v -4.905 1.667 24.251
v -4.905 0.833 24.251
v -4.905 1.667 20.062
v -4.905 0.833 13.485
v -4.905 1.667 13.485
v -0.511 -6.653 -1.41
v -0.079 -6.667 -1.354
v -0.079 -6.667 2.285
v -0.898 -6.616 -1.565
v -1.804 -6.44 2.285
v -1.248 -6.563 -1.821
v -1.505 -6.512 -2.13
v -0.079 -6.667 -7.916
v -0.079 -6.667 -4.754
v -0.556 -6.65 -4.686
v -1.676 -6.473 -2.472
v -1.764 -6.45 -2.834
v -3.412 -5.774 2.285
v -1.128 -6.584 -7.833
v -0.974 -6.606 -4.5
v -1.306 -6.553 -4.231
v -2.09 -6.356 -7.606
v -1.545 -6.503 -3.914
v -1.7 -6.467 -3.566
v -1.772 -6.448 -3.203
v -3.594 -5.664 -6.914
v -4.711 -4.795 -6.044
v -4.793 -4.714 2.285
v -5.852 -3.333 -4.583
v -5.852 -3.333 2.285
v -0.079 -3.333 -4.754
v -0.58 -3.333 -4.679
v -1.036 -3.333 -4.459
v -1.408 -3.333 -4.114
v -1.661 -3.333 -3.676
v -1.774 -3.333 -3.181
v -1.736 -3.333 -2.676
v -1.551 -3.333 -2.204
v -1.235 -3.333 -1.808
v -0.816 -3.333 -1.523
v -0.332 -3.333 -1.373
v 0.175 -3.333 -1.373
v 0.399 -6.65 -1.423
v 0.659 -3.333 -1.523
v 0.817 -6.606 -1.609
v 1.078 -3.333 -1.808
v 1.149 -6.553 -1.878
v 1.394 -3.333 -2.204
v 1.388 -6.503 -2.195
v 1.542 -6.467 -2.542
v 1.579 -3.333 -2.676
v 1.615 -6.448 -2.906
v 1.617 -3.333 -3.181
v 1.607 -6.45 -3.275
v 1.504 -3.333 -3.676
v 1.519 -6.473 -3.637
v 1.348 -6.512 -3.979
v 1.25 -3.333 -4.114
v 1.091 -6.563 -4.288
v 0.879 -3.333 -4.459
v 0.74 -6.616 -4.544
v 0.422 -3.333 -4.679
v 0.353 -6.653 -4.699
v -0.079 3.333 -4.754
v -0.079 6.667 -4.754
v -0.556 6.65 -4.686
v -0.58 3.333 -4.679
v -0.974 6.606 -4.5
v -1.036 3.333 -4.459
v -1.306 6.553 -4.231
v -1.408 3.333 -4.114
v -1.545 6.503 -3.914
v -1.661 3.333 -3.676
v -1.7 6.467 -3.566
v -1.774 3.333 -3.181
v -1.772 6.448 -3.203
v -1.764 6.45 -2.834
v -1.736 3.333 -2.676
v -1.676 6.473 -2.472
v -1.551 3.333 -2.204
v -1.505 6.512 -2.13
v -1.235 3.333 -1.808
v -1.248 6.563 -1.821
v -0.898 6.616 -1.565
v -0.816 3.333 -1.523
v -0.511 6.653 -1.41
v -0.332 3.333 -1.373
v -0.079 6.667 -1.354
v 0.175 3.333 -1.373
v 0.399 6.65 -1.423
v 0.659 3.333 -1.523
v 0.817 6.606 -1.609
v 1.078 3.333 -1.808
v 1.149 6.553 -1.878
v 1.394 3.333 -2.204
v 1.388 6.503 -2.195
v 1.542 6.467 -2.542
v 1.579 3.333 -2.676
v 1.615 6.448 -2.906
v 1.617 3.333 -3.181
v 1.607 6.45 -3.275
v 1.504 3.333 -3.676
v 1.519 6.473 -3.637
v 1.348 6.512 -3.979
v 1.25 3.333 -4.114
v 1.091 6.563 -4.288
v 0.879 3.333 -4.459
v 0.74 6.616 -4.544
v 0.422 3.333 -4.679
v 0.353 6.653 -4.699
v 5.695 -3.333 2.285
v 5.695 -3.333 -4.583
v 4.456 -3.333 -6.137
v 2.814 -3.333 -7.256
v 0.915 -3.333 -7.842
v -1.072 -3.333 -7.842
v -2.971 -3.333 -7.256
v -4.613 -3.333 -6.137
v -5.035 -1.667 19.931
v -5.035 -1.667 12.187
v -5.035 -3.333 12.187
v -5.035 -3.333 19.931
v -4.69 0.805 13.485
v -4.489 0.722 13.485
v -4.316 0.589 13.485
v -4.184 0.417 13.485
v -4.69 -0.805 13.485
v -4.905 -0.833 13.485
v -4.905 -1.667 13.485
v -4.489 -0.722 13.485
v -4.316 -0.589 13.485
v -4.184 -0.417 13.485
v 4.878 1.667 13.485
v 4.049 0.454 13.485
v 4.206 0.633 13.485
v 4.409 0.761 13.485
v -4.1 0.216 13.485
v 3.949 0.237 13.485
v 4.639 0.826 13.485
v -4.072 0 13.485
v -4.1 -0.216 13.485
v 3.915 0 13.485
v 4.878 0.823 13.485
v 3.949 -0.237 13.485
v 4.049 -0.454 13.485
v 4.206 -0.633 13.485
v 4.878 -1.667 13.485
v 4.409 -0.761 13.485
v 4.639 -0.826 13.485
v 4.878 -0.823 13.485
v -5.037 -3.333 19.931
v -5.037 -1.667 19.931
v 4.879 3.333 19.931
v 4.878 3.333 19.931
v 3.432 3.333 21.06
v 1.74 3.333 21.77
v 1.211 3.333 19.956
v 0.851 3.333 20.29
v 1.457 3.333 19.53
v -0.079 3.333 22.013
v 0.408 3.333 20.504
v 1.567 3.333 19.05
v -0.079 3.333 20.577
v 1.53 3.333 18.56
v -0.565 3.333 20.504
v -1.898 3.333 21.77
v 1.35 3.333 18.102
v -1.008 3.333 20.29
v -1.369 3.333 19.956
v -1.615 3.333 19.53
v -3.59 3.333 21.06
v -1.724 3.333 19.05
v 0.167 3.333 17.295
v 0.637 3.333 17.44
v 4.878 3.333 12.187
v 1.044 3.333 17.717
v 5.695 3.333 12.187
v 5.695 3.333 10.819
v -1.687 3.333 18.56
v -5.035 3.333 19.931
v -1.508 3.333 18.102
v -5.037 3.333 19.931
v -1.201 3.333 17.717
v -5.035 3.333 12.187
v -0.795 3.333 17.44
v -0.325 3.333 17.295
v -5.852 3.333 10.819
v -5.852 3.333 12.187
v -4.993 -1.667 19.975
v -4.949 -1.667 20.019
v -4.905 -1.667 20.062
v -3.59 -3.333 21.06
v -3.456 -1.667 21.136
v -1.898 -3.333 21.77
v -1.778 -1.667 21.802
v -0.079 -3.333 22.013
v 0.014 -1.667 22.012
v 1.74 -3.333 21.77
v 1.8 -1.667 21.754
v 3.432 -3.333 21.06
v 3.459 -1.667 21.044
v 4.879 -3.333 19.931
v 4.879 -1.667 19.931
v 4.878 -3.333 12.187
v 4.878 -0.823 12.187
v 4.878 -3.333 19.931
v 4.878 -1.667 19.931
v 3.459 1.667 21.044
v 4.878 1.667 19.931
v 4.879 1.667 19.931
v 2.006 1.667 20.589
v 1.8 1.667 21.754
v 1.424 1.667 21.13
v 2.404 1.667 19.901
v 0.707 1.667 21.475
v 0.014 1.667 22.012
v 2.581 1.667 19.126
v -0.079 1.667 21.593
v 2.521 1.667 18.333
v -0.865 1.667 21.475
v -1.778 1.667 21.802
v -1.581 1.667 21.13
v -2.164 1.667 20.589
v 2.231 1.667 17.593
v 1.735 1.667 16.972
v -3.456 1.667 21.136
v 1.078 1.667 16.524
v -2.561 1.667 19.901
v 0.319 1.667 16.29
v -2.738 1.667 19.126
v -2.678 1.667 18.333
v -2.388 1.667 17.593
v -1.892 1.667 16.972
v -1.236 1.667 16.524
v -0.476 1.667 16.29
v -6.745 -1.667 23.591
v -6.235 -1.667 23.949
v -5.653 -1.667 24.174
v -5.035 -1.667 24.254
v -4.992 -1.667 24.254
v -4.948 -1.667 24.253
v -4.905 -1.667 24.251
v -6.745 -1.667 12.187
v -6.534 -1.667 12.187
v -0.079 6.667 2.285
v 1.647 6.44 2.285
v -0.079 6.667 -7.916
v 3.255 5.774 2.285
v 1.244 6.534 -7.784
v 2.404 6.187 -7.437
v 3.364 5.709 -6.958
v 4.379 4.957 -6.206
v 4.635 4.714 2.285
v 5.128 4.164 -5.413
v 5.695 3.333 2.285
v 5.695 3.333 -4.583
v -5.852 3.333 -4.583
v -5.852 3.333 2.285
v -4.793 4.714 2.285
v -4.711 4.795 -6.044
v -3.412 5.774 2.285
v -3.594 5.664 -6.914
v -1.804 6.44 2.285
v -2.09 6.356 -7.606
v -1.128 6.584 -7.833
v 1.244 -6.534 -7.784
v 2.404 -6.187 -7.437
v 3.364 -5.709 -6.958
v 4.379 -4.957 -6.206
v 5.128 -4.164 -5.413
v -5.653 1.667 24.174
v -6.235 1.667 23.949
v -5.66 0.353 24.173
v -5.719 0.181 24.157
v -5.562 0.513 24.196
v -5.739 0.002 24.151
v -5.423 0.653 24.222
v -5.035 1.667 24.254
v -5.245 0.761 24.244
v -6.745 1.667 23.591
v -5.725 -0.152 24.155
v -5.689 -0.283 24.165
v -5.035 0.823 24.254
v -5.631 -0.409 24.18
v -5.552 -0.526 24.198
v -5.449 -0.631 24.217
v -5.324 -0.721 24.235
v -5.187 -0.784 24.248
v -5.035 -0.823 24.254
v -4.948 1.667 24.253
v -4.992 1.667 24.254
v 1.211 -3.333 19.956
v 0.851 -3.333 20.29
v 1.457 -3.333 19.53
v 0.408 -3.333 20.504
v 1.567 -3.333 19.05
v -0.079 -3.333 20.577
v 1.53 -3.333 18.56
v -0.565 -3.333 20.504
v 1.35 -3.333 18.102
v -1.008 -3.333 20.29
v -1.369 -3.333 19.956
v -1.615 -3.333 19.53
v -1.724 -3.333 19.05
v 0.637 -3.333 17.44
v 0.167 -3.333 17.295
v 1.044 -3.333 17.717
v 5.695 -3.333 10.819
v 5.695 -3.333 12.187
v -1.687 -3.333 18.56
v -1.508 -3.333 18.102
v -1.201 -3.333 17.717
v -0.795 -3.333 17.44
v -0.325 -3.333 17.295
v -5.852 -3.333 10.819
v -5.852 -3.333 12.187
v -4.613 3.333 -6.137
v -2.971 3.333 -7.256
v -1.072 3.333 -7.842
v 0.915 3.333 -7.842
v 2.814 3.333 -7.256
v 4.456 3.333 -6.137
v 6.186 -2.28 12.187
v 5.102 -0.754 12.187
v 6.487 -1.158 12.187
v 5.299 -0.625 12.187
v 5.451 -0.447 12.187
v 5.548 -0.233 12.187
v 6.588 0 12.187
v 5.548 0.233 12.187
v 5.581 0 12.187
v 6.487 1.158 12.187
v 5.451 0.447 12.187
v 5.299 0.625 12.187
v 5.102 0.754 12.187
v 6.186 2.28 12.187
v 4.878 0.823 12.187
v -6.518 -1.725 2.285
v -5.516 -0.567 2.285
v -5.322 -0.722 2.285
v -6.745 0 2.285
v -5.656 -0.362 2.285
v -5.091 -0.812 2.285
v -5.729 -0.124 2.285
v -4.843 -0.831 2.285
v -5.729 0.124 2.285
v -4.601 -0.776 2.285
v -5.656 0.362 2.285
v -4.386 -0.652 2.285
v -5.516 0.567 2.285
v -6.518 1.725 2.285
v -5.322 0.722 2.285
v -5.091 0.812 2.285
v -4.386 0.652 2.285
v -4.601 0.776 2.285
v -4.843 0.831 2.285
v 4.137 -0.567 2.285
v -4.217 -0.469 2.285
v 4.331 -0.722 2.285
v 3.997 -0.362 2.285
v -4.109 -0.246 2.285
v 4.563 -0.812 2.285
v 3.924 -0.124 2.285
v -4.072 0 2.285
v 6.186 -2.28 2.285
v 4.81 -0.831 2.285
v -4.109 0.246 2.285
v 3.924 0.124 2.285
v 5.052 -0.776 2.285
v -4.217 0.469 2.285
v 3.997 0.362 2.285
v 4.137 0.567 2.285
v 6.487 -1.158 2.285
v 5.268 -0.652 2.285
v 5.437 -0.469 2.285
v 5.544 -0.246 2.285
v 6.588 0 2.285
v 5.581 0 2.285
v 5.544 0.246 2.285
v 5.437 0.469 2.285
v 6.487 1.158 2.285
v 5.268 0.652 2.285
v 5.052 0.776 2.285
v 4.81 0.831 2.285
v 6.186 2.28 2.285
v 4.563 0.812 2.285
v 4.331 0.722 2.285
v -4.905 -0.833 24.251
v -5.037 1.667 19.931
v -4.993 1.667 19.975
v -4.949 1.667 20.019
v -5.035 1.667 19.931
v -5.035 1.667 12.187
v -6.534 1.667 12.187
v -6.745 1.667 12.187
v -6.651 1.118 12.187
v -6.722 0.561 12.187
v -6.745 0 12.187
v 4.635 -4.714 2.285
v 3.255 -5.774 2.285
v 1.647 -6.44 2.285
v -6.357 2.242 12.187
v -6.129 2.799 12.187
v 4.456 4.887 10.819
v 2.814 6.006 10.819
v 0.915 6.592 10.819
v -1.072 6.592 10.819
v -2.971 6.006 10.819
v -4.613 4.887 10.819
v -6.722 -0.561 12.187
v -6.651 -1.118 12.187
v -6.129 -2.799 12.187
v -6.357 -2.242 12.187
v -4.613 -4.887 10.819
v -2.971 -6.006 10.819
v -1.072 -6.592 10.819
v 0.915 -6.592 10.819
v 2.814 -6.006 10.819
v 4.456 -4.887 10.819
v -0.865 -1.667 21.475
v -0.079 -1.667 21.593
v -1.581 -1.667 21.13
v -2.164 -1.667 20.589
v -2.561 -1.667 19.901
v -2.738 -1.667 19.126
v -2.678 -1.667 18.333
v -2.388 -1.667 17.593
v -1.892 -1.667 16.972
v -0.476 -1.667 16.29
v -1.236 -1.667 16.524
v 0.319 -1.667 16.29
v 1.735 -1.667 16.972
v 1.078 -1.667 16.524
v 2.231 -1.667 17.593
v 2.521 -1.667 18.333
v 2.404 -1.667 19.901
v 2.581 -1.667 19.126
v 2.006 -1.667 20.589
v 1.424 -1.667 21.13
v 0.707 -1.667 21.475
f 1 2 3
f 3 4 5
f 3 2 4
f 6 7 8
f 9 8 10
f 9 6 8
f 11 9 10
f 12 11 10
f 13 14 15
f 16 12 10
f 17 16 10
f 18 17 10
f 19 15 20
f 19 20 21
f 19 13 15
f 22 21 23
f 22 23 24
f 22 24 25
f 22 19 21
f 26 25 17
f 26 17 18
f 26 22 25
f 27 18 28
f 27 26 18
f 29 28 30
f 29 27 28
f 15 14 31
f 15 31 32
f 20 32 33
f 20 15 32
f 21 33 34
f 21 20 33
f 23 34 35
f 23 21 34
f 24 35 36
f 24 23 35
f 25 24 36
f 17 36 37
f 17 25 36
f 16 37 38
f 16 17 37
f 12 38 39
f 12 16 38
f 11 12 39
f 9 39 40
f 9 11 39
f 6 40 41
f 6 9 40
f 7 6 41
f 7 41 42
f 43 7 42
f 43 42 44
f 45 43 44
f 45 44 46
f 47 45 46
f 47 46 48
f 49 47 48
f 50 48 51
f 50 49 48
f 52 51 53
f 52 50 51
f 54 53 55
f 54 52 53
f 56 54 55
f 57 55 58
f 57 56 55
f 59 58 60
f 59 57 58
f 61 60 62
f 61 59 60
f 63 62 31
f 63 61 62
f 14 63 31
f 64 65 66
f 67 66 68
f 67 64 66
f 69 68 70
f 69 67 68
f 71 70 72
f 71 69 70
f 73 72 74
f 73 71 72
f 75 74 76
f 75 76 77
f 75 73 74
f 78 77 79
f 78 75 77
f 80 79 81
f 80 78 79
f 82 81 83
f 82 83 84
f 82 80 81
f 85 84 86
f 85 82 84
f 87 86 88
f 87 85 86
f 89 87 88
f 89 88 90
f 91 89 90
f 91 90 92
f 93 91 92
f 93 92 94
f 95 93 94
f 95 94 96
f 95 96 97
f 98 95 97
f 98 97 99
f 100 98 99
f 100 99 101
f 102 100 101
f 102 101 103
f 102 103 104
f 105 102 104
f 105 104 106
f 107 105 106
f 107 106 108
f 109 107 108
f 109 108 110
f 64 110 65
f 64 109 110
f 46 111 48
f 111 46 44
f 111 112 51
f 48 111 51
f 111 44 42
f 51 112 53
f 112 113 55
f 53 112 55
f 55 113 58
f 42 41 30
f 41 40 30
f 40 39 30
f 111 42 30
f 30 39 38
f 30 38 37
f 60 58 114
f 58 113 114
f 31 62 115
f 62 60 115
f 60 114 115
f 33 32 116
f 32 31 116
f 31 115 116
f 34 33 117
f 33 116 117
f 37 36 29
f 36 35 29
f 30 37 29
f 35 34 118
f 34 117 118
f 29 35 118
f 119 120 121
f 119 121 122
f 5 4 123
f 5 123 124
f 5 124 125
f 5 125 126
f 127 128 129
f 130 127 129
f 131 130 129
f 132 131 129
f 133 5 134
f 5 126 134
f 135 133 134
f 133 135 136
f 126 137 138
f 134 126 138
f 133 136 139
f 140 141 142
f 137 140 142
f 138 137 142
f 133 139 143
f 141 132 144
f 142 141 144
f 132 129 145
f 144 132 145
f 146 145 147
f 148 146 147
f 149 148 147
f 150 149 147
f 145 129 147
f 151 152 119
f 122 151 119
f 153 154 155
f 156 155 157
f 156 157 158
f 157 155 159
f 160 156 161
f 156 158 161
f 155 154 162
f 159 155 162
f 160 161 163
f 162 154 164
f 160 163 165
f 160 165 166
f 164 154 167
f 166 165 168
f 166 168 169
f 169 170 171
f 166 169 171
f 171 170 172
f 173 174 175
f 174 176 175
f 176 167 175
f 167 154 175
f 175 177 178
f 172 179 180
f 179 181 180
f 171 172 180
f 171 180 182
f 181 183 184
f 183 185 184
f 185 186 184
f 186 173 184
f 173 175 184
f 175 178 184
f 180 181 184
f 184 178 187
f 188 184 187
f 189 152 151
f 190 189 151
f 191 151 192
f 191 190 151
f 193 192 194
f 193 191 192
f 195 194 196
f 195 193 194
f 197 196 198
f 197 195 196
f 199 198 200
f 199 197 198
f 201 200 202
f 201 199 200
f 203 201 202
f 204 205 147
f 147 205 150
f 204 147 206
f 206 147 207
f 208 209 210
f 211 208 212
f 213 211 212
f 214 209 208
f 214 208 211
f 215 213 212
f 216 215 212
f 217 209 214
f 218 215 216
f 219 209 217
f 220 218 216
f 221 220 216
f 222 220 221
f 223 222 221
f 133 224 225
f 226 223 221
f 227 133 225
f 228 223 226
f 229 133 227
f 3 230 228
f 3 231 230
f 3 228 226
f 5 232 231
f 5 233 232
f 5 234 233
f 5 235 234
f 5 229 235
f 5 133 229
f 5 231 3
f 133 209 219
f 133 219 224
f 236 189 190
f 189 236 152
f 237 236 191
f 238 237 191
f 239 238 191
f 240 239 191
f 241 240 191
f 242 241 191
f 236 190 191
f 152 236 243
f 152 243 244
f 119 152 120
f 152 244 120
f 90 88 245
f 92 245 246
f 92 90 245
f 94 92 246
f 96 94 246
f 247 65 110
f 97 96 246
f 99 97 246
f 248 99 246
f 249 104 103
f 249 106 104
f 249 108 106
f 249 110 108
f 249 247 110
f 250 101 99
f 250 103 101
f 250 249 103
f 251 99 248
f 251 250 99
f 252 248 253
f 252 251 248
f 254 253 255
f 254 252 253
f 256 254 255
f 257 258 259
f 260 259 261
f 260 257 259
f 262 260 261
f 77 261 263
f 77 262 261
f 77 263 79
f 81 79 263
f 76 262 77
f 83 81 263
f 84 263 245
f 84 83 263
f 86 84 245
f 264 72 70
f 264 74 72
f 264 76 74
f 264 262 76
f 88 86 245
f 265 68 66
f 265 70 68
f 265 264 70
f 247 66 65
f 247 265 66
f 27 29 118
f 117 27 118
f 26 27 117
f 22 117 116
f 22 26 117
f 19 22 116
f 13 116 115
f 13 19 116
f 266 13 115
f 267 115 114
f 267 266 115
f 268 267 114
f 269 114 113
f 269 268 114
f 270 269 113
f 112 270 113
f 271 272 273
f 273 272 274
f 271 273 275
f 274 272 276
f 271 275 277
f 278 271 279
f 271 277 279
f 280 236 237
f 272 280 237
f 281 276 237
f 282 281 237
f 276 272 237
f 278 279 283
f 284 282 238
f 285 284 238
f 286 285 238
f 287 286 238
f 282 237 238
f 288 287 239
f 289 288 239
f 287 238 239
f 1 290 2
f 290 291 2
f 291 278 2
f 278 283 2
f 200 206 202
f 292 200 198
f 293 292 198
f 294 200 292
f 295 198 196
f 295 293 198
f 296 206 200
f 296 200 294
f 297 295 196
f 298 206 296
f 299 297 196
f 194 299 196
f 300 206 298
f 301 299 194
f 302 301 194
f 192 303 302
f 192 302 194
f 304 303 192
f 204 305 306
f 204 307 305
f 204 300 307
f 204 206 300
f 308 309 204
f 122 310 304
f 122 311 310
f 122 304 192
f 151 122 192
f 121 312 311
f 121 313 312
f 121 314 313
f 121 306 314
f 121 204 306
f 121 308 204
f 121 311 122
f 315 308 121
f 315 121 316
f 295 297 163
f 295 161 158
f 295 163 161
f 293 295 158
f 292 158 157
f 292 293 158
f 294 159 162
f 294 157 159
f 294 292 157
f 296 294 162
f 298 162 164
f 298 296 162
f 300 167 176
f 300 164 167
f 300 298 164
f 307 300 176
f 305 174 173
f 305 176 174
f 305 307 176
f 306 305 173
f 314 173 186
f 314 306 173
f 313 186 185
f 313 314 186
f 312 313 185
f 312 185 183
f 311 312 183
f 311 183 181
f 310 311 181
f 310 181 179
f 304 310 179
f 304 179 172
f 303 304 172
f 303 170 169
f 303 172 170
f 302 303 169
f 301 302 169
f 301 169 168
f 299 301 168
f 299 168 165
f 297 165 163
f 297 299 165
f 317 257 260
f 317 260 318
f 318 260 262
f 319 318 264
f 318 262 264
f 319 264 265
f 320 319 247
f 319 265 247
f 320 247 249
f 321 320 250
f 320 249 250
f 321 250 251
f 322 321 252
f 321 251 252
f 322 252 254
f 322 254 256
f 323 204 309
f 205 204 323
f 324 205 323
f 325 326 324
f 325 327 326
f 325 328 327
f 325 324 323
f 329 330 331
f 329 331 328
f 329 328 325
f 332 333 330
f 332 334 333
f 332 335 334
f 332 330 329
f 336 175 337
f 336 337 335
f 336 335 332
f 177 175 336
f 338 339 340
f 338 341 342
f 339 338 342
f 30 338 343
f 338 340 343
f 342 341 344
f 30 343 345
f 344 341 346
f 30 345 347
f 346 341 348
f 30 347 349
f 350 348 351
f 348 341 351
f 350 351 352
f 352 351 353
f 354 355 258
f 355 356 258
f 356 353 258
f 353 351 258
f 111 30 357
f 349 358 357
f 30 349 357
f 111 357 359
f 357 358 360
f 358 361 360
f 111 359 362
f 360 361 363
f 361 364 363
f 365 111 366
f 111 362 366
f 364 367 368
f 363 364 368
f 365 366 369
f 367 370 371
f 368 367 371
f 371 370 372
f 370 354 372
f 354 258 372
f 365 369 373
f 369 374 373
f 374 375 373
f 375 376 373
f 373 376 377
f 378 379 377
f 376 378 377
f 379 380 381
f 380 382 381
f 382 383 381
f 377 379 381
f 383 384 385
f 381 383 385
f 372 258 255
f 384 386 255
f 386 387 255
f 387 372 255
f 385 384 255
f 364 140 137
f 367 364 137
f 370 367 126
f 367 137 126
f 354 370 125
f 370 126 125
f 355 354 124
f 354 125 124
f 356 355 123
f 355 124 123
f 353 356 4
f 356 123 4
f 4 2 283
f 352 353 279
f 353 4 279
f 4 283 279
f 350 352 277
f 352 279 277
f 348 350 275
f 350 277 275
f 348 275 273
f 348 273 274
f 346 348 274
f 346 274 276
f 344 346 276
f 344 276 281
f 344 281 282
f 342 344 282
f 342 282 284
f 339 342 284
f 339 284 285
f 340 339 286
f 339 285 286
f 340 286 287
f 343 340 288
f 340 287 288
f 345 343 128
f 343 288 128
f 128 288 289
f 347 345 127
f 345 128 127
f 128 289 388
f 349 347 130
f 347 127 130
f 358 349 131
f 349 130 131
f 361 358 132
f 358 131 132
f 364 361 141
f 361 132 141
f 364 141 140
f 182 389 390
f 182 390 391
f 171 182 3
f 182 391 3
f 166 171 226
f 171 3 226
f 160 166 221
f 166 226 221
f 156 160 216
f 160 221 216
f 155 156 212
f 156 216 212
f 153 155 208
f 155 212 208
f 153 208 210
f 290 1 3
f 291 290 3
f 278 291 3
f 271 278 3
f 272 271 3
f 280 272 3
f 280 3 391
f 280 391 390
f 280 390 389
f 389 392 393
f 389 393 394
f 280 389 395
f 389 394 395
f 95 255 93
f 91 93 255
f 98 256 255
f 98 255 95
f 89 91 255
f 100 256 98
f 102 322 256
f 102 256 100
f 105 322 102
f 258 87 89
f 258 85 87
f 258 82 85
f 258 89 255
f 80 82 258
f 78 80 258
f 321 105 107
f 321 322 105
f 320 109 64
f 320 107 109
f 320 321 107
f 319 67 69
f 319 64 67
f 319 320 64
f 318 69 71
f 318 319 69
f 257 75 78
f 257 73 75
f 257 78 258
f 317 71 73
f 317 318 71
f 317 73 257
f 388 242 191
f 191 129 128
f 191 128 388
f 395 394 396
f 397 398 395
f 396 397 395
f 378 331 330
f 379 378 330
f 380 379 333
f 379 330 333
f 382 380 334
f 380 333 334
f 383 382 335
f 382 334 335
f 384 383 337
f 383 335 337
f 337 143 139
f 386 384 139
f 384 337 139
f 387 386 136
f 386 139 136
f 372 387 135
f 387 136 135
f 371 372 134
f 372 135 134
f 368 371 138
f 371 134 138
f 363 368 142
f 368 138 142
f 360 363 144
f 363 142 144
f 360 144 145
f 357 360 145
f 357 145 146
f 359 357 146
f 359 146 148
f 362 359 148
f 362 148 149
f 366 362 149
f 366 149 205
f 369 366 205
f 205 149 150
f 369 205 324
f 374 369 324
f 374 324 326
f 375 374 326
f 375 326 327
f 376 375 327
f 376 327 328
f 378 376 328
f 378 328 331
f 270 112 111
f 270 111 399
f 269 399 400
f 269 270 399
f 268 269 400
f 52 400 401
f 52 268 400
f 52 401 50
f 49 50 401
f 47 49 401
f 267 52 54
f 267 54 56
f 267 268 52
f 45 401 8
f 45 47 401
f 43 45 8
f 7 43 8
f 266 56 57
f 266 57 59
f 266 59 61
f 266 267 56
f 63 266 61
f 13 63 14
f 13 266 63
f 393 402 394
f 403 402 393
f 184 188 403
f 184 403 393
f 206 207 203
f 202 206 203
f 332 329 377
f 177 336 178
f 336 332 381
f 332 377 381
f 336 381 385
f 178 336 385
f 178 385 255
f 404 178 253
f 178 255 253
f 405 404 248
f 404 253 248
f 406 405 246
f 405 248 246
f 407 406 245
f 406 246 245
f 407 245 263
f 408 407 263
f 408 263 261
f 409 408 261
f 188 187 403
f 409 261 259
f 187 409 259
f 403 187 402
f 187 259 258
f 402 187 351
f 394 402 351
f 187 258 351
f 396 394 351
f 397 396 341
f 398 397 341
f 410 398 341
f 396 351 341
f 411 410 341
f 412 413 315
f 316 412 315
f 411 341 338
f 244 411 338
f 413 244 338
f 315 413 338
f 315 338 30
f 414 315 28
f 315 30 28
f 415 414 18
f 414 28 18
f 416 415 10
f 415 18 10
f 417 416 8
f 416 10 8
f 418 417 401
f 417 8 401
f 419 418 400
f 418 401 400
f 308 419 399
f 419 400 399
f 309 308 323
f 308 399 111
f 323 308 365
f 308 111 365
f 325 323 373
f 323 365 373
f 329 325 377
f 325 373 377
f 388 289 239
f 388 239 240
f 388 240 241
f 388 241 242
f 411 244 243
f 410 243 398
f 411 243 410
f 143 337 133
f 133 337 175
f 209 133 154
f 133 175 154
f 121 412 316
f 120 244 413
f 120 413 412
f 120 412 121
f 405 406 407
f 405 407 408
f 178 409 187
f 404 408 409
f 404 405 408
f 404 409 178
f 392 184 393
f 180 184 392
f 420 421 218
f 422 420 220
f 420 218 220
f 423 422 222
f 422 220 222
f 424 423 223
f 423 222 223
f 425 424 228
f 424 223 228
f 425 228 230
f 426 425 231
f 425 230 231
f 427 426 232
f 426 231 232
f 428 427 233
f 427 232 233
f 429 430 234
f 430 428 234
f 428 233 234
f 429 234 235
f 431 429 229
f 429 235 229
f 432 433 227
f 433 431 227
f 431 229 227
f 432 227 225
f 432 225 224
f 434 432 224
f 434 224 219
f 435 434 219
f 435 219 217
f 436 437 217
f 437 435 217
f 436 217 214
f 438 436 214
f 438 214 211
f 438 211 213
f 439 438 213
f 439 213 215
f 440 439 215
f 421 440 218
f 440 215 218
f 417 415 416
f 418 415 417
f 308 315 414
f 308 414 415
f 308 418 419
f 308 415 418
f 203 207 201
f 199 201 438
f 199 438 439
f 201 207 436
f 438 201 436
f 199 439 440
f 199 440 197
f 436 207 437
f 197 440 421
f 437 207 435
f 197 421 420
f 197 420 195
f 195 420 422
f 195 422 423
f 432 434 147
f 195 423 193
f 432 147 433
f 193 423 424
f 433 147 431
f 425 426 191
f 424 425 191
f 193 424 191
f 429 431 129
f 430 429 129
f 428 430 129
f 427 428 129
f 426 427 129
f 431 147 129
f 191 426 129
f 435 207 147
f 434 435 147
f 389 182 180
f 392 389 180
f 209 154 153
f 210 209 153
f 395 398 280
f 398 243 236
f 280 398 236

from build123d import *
from build123d.topology import SkipClean

# Parameters (mm, degrees)
SKETCH2_R                       = 10
PHALANGE_LENGTH_DEPTH           = 16.8
BOSS_EXTRUDE3_DEPTH             = 5
BOSS_EXTRUDE4_DEPTH             = 5
BOSS_EXTRUDE4_DEPTH_BACK        = 5
CUT_EXTRUDE2_START              = -15.3025
CUT_EXTRUDE2_DEPTH              = 15.3025
SKETCH7_R                       = 1.65
CUT_EXTRUDE3_DEPTH              = 10
CUT_EXTRUDE4_DEPTH              = 2.5
CUT_EXTRUDE4_DEPTH_BACK         = 2.5
CUT_EXTRUDE7_REACH              = 38.861
SKETCH4_R                       = 1.65
CUT_EXTRUDE7_DIRECTION_2_REACH  = 38.861
CUT_EXTRUDE_THIN1_START         = 16.8
CUT_EXTRUDE_THIN1_DEPTH         = 10.361670454
BOSS_EXTRUDE5_REACH             = 37.917
SKETCH9_R                       = 4
SKETCH9_R_2                     = 1.65
CUT_EXTRUDE8_REACH              = 37.079
SKETCH10_R                      = 1.25
CUT_EXTRUDE9_START              = -4
CUT_EXTRUDE9_DEPTH              = 4
CUT_EXTRUDE10_REACH             = 37.917
CUT_EXTRUDE10_DIRECTION_2_REACH = 37.917
CUT_EXTRUDE11_START             = -10
CUT_EXTRUDE11_OUTLINE_W         = 2.565773848
CUT_EXTRUDE11_OUTLINE_H         = 11.6166929
CUT_EXTRUDE11_DEPTH             = 10
BOSS_EXTRUDE7_REACH             = 35.643
CUT_EXTRUDE12_REACH             = 37.079
SKETCH10_2_R                    = 1.25
CUT_EXTRUDE12_DIRECTION_2_REACH = 37.079
SKETCH17_R                      = 1.25
SKETCH17_W                      = 2.42123439
SKETCH17_H                      = 5
CUT_EXTRUDE14_DEPTH             = 16.148519
SCALE1_SCALE                    = 0.666666667
CUT_EXTRUDE15_START             = -10
SKETCH18_R                      = 1.65
CUT_EXTRUDE15_DEPTH             = 13.333338
CUT_EXTRUDE16_START             = -3.333333
SKETCH19_R                      = 1.7
CUT_EXTRUDE16_DEPTH             = 13.333338


# Read off the part's stored shape, not the designer's step: Cut-Extrude-Thin1, Cut-Extrude11
with BuildPart() as part:
    # Sketch2 → Phalange Length (new body)
    with BuildSketch(Plane.XY):
        Circle(SKETCH2_R)
    extrude(amount=PHALANGE_LENGTH_DEPTH)

    # Sketch3 → Boss-Extrude3 (add)
    with BuildSketch(Plane(origin=(0, -10, 0), x_dir=(-1, 0, 0), z_dir=(0, -1, 0))):
        with BuildLine():
            Line((-10, 5.302499701), (-10, 0))
            Line((-10, 0), (10, 0))
            Line((10, 0), (10, 5.302499701))
            ThreePointArc((10, 5.302499701), (0, 15.302499701), (-10, 5.302499701))
        make_face()
    boss_extrude3 = extrude(amount=-BOSS_EXTRUDE3_DEPTH)

    # Mirror1: Boss-Extrude3 across plane
    add(boss_extrude3.mirror(Plane.ZX))

    # Sketch5 → Boss-Extrude4 (add, two sides: drawn at the far end of the back side and taken through both)
    with BuildSketch(Plane(origin=(0, 0, 0), x_dir=(1, 0, 0), z_dir=(0, 1, 0)).offset(-BOSS_EXTRUDE4_DEPTH_BACK)):
        with BuildLine():
            Line((-10, -22.583157911), (-10, -16.8))
            Line((-10, -16.8), (10, -16.8))
            Line((10, -16.8), (10, -22.583157911))
            ThreePointArc((10, -22.583157911), (0, -32.151984156), (-10, -22.583157911))
        make_face()
    extrude(amount=BOSS_EXTRUDE4_DEPTH + BOSS_EXTRUDE4_DEPTH_BACK)

    # Sketch6 → Cut-Extrude2 (cut)
    with SkipClean():  # the faces are left unmerged after this step: merging them gives an invalid solid
        with BuildSketch(Plane.XY.offset(CUT_EXTRUDE2_START)):
            with BuildLine():
                ThreePointArc((0, 10), (5, 8.660254038), (8.660254038, 5))
                Line((8.660254038, 5), (10, 5))
                Line((10, 5), (10, 10))
                Line((10, 10), (0, 10))
            make_face()
            with BuildLine():
                Line((10, -5), (8.660254038, -5))
                ThreePointArc((8.660254038, -5), (5, -8.660254038), (0, -10))
                Line((0, -10), (10, -10))
                Line((10, -10), (10, -5))
            make_face()
            with BuildLine():
                ThreePointArc((-8.660254038, 5), (-5, 8.660254038), (0, 10))
                Line((0, 10), (-10, 10))
                Line((-10, 10), (-10, 5))
                Line((-10, 5), (-8.660254038, 5))
            make_face()
            with BuildLine():
                Line((-10, -10), (0, -10))
                ThreePointArc((0, -10), (-5, -8.660254038), (-8.660254038, -5))
                Line((-8.660254038, -5), (-10, -5))
                Line((-10, -5), (-10, -10))
            make_face()
        extrude(amount=CUT_EXTRUDE2_DEPTH, mode=Mode.SUBTRACT)

    # Sketch7 → Cut-Extrude3 (cut)
    with SkipClean():  # the faces are left unmerged after this step: merging them gives an invalid solid
        with BuildSketch(Plane(origin=(0, 5, 0), x_dir=(1, 0, 0), z_dir=(0, 1, 0))):
            with Locations(Location((0, -24.961984156, 0), (0, 0, 270))):
                Circle(SKETCH7_R)
        extrude(amount=-CUT_EXTRUDE3_DEPTH, mode=Mode.SUBTRACT)

    # Sketch5<2> → Cut-Extrude4 (cut, two sides: drawn at the far end of the back side and taken through both)
    with BuildSketch(Plane(origin=(0, 0, 0), x_dir=(1, 0, 0), z_dir=(0, 1, 0)).offset(-CUT_EXTRUDE4_DEPTH_BACK)):
        with BuildLine():
            Line((-10, -22.583157911), (-10, -16.8))
            Line((-10, -16.8), (10, -16.8))
            Line((10, -16.8), (10, -22.583157911))
            ThreePointArc((10, -22.583157911), (0, -32.151984156), (-10, -22.583157911))
        make_face()
    extrude(amount=CUT_EXTRUDE4_DEPTH + CUT_EXTRUDE4_DEPTH_BACK, mode=Mode.SUBTRACT)

    # Sketch4 → Cut-Extrude7 (cut, up to next)
    with BuildSketch(Plane(origin=(0, -5, 0), x_dir=(1, 0, 0), z_dir=(0, 1, 0)), mode=Mode.PRIVATE) as cut_extrude7_sk1:
        with Locations(Location((0, 8.010159673, 0), (0, 0, 270))):
            Circle(SKETCH4_R)
    cut_extrude7_tool1 = extrude(cut_extrude7_sk1.sketch, amount=-CUT_EXTRUDE7_REACH, mode=Mode.PRIVATE) & part.part
    add(cut_extrude7_tool1.solids().sort_by_distance((0, -5, -8.01016))[0], mode=Mode.SUBTRACT)

    # Sketch4 → Cut-Extrude7 direction 2 (cut, up to next)
    with BuildSketch(Plane(origin=(0, -5, 0), x_dir=(1, 0, 0), z_dir=(0, 1, 0)), mode=Mode.PRIVATE) as cut_extrude7_direction_2_sk1:
        with Locations(Location((0, 8.010159673, 0), (0, 0, 270))):
            Circle(SKETCH4_R)
    cut_extrude7_direction_2_tool1 = extrude(cut_extrude7_direction_2_sk1.sketch, amount=CUT_EXTRUDE7_DIRECTION_2_REACH, mode=Mode.PRIVATE) & part.part
    add(cut_extrude7_direction_2_tool1.solids().sort_by_distance((0, -5, -8.01016))[0], mode=Mode.SUBTRACT)

    # Cut-Extrude-Thin1 outline → Cut-Extrude-Thin1 (cut)
    with SkipClean():  # the faces are left unmerged after this step: merging them gives an invalid solid
        with BuildSketch(Plane.XY.offset(CUT_EXTRUDE_THIN1_START)):
            with BuildLine():
                ThreePointArc((8.660254038, 5), (9.256147934, 3.78466979), (9.682458366, 2.5))
                Line((9.682458366, 2.5), (10, 2.5))
                Line((10, 2.5), (10, 5))
                Line((10, 5), (8.660254038, 5))
            make_face()
            with BuildLine():
                Line((10, -2.5), (9.682458366, -2.5))
                ThreePointArc((9.682458366, -2.5), (9.256147934, -3.78466979), (8.660254038, -5))
                Line((8.660254038, -5), (10, -5))
                Line((10, -5), (10, -2.5))
            make_face()
            with BuildLine():
                Line((-10, 2.5), (-9.682458366, 2.5))
                ThreePointArc((-9.682458366, 2.5), (-9.256147934, 3.78466979), (-8.660254038, 5))
                Line((-8.660254038, 5), (-10, 5))
                Line((-10, 5), (-10, 2.5))
            make_face()
            with BuildLine():
                ThreePointArc((-8.660254038, -5), (-9.256147934, -3.78466979), (-9.682458366, -2.5))
                Line((-9.682458366, -2.5), (-10, -2.5))
                Line((-10, -2.5), (-10, -5))
                Line((-10, -5), (-8.660254038, -5))
            make_face()
        extrude(amount=CUT_EXTRUDE_THIN1_DEPTH, mode=Mode.SUBTRACT)

    # Sketch9 → Boss-Extrude5 (add, up to next)
    with BuildSketch(Plane.XZ.offset(-2.5), mode=Mode.PRIVATE) as boss_extrude5_sk1:
        with Locations(Location((0, 24.961984156, 0), (0, 0, 90))):
            Circle(SKETCH9_R)
        with Locations(Location((0, 24.961984156, 0), (0, 0, 90))):
            Circle(SKETCH9_R_2, mode=Mode.SUBTRACT)
    boss_extrude5_tool1 = extrude(boss_extrude5_sk1.sketch, amount=BOSS_EXTRUDE5_REACH, mode=Mode.PRIVATE) - part.part
    add(boss_extrude5_tool1.solids().sort_by_distance((0, 2.5, 21.075121))[0])

    # Sketch10 → Cut-Extrude8 (cut, up to next)
    with BuildSketch(Plane.XY.offset(16.8), mode=Mode.PRIVATE) as cut_extrude8_sk1:
        with Locations((7.239961745, 0)):
            Circle(SKETCH10_R)
    cut_extrude8_tool1 = extrude(cut_extrude8_sk1.sketch, amount=-CUT_EXTRUDE8_REACH, mode=Mode.PRIVATE) & part.part
    # Sketch10 → Cut-Extrude8 (cut, up to next)
    with BuildSketch(Plane.XY.offset(16.8), mode=Mode.PRIVATE) as cut_extrude8_sk2:
        with Locations((-7.239961745, 0)):
            Circle(SKETCH10_R)
    cut_extrude8_tool2 = extrude(cut_extrude8_sk2.sketch, amount=-CUT_EXTRUDE8_REACH, mode=Mode.PRIVATE) & part.part
    add(cut_extrude8_tool1.solids().sort_by_distance((7.239962, 0, 16.8))[0], mode=Mode.SUBTRACT)
    add(cut_extrude8_tool2.solids().sort_by_distance((-7.239962, 0, 16.8))[0], mode=Mode.SUBTRACT)

    # Sketch11 → Cut-Extrude9 (cut)
    with SkipClean():  # the faces are left unmerged after this step: merging them gives an invalid solid
        with BuildSketch(Plane.XY.offset(16.8).offset(CUT_EXTRUDE9_START)):
            with BuildLine():
                ThreePointArc((8.660254038, 5), (0, 10), (-8.660254038, 5))
                Line((-8.660254038, 5), (8.660254038, 5))
            make_face()
            with BuildLine():
                Line((8.660254038, -5), (-8.660254038, -5))
                ThreePointArc((-8.660254038, -5), (0, -10), (8.660254038, -5))
            make_face()
        extrude(amount=CUT_EXTRUDE9_DEPTH, mode=Mode.SUBTRACT)

    # Sketch12 → Cut-Extrude10 (cut, up to next)
    with BuildSketch(Plane.XZ.offset(-2.5), mode=Mode.PRIVATE) as cut_extrude10_sk1:
        with BuildLine():
            Line((-10.033719202, 32.151984156), (-10.033719202, 24.964892021))
            Line((-10.033719202, 24.964892021), (-8.660254038, 24.964892021))
            ThreePointArc((-8.660254038, 24.964892021), (0, 29.590740593), (8.660254038, 24.964892021))
            Line((8.660254038, 24.964892021), (10.033719202, 24.964892021))
            Line((10.033719202, 24.964892021), (10.033719202, 32.151984156))
            Line((10.033719202, 32.151984156), (-10.033719202, 32.151984156))
        make_face()
    cut_extrude10_tool1 = extrude(cut_extrude10_sk1.sketch, amount=CUT_EXTRUDE10_REACH, mode=Mode.PRIVATE) & part.part
    add(cut_extrude10_tool1.solids().sort_by_distance((0, 2.5, 29.650279))[0], mode=Mode.SUBTRACT)

    # Sketch12 → Cut-Extrude10 direction 2 (cut, up to next)
    with BuildSketch(Plane.XZ.offset(-2.5), mode=Mode.PRIVATE) as cut_extrude10_direction_2_sk1:
        with BuildLine():
            Line((-10.033719202, 32.151984156), (-10.033719202, 24.964892021))
            Line((-10.033719202, 24.964892021), (-8.660254038, 24.964892021))
            ThreePointArc((-8.660254038, 24.964892021), (0, 29.590740593), (8.660254038, 24.964892021))
            Line((8.660254038, 24.964892021), (10.033719202, 24.964892021))
            Line((10.033719202, 24.964892021), (10.033719202, 32.151984156))
            Line((10.033719202, 32.151984156), (-10.033719202, 32.151984156))
        make_face()
    cut_extrude10_direction_2_tool1 = extrude(cut_extrude10_direction_2_sk1.sketch, amount=-CUT_EXTRUDE10_DIRECTION_2_REACH, mode=Mode.PRIVATE) & part.part
    add(cut_extrude10_direction_2_tool1.solids().sort_by_distance((0, 2.5, 29.650279))[0], mode=Mode.SUBTRACT)

    # Cut-Extrude11 outline → Cut-Extrude11 (cut)
    with BuildSketch(Plane.XZ.offset(5).offset(CUT_EXTRUDE11_START)):
        with Locations((-8.717113076, 20.660571369)):
            Rectangle(CUT_EXTRUDE11_OUTLINE_W, CUT_EXTRUDE11_OUTLINE_H)
        with Locations((8.717113076, 20.660571369)):
            Rectangle(CUT_EXTRUDE11_OUTLINE_W, CUT_EXTRUDE11_OUTLINE_H)
    extrude(amount=CUT_EXTRUDE11_DEPTH, mode=Mode.SUBTRACT)

    # Boss-Extrude7: up to this face of the body (flat: up to its plane)
    boss_extrude7_end = Plane(part.part.faces().sort_by_distance((0, 2.5, 16.996174341))[0])
    # Sketch16 → Boss-Extrude7 (add, up to the picked face)
    with BuildSketch(Plane(origin=(0, -2.5, 0), x_dir=(1, 0, 0), z_dir=(0, 1, 0)), mode=Mode.PRIVATE) as boss_extrude7_sk1:
        with BuildLine():
            Line((-4.818727355, -14.852224919), (-7.434226152, -14.852224919))
            Line((-7.434226152, -14.852224919), (-10, -14.852224919))
            Line((-10, -14.852224919), (-10, -31.958561033))
            ThreePointArc((-10, -31.958561033), (-8.808295471, -32.690817912), (-7.43422564, -32.952145139))
            ThreePointArc((-7.43422564, -32.952145139), (-6.033645007, -32.699721533), (-4.818727355, -31.958561033))
            Line((-4.818727355, -31.958561033), (-4.818727355, -28.409527951))
            ThreePointArc((-4.818727355, -28.409527951), (-6.204248493, -27.542230104), (-7.437080645, -26.468917819))
            Line((-7.437080645, -26.468917819), (-7.434226152, -26.468917819))
            Line((-7.434226152, -26.468917819), (-7.434226152, -16.8))
            Line((-7.434226152, -16.8), (-4.818727355, -16.8))
            Line((-4.818727355, -16.8), (-4.818727355, -14.852224919))
        make_face()
    boss_extrude7_tool1 = split(extrude(boss_extrude7_sk1.sketch, amount=BOSS_EXTRUDE7_REACH, mode=Mode.PRIVATE), bisect_by=boss_extrude7_end, keep=Keep.BOTH, mode=Mode.PRIVATE)
    # Sketch16 → Boss-Extrude7 (add, up to the picked face)
    with BuildSketch(Plane(origin=(0, -2.5, 0), x_dir=(1, 0, 0), z_dir=(0, 1, 0)), mode=Mode.PRIVATE) as boss_extrude7_sk2:
        with BuildLine():
            Line((-4.818727355, -28.409527951), (-4.818727355, -16.8))
            Line((-4.818727355, -16.8), (-7.434226152, -16.8))
            Line((-7.434226152, -16.8), (-7.434226152, -26.468917819))
            Line((-7.434226152, -26.468917819), (-7.437080645, -26.468917819))
            ThreePointArc((-7.437080645, -26.468917819), (-6.204248493, -27.542230104), (-4.818727355, -28.409527951))
        make_face()
    boss_extrude7_tool2 = split(extrude(boss_extrude7_sk2.sketch, amount=BOSS_EXTRUDE7_REACH, mode=Mode.PRIVATE), bisect_by=boss_extrude7_end, keep=Keep.BOTH, mode=Mode.PRIVATE)
    add(boss_extrude7_tool1.solids().sort_by(Axis((-7.989429, -2.5, 24.433344), (0, 1, 0)))[0])
    add(boss_extrude7_tool2.solids().sort_by(Axis((-6.08748, -2.5, 22.1879), (0, 1, 0)))[0])

    # Sketch10<2> → Cut-Extrude12 (cut, up to next)
    with BuildSketch(Plane.XY.offset(16.8), mode=Mode.PRIVATE) as cut_extrude12_sk1:
        with Locations((-7.239961745, 0)):
            Circle(SKETCH10_2_R)
    cut_extrude12_tool1 = extrude(cut_extrude12_sk1.sketch, amount=CUT_EXTRUDE12_REACH, mode=Mode.PRIVATE) & part.part
    add(cut_extrude12_tool1.solids().sort_by_distance((-7.239962, 0, 16.8))[0], mode=Mode.SUBTRACT)

    # Sketch10<2> → Cut-Extrude12 direction 2 (cut, up to next)
    with BuildSketch(Plane.XY.offset(16.8), mode=Mode.PRIVATE) as cut_extrude12_direction_2_sk1:
        with Locations((-7.239961745, 0)):
            Circle(SKETCH10_2_R)
    cut_extrude12_direction_2_tool1 = extrude(cut_extrude12_direction_2_sk1.sketch, amount=-CUT_EXTRUDE12_DIRECTION_2_REACH, mode=Mode.PRIVATE) & part.part
    add(cut_extrude12_direction_2_tool1.solids().sort_by_distance((-7.239962, 0, 16.8))[0], mode=Mode.SUBTRACT)

    # Sketch17 → Cut-Extrude14 (cut)
    with SkipClean():  # the faces are left unmerged after this step: merging them gives an invalid solid
        with BuildSketch(Plane.XY.offset(16.8)):
            with Locations((-7.239961745, 0)):
                Circle(SKETCH17_R)
            with Locations((-6.02934455, 0)):
                Rectangle(SKETCH17_W, SKETCH17_H)
        extrude(amount=CUT_EXTRUDE14_DEPTH, mode=Mode.SUBTRACT)


with BuildPart() as part_1:
    # Scale1: scaled about (-0.235925665, -2.1e-07, 6.856472765)
    add(part.part.scale(SCALE1_SCALE).moved(Location((-0.078641888, -7e-08, 2.285490922))))

    # Sketch18 → Cut-Extrude15 (cut)
    with BuildSketch(Plane(origin=(0, 3.333328812, 0), x_dir=(1, 0, 0), z_dir=(0, 1, 0)).offset(CUT_EXTRUDE15_START)):
        with Locations(Location((-0.078652268, -18.926980833, 0), (0, 0, 270))):
            Circle(SKETCH18_R)
    extrude(amount=CUT_EXTRUDE15_DEPTH, mode=Mode.SUBTRACT)

    # Sketch19 → Cut-Extrude16 (cut)
    with BuildSketch(Plane(origin=(0, -3.333337854, 0), x_dir=(1, 0, 0), z_dir=(0, 1, 0)).offset(CUT_EXTRUDE16_START)):
        with Locations(Location((-0.078652268, 3.054448386, 0), (0, 0, 90))):
            Circle(SKETCH19_R)
    extrude(amount=CUT_EXTRUDE16_DEPTH, mode=Mode.SUBTRACT)


solid = part_1.part
